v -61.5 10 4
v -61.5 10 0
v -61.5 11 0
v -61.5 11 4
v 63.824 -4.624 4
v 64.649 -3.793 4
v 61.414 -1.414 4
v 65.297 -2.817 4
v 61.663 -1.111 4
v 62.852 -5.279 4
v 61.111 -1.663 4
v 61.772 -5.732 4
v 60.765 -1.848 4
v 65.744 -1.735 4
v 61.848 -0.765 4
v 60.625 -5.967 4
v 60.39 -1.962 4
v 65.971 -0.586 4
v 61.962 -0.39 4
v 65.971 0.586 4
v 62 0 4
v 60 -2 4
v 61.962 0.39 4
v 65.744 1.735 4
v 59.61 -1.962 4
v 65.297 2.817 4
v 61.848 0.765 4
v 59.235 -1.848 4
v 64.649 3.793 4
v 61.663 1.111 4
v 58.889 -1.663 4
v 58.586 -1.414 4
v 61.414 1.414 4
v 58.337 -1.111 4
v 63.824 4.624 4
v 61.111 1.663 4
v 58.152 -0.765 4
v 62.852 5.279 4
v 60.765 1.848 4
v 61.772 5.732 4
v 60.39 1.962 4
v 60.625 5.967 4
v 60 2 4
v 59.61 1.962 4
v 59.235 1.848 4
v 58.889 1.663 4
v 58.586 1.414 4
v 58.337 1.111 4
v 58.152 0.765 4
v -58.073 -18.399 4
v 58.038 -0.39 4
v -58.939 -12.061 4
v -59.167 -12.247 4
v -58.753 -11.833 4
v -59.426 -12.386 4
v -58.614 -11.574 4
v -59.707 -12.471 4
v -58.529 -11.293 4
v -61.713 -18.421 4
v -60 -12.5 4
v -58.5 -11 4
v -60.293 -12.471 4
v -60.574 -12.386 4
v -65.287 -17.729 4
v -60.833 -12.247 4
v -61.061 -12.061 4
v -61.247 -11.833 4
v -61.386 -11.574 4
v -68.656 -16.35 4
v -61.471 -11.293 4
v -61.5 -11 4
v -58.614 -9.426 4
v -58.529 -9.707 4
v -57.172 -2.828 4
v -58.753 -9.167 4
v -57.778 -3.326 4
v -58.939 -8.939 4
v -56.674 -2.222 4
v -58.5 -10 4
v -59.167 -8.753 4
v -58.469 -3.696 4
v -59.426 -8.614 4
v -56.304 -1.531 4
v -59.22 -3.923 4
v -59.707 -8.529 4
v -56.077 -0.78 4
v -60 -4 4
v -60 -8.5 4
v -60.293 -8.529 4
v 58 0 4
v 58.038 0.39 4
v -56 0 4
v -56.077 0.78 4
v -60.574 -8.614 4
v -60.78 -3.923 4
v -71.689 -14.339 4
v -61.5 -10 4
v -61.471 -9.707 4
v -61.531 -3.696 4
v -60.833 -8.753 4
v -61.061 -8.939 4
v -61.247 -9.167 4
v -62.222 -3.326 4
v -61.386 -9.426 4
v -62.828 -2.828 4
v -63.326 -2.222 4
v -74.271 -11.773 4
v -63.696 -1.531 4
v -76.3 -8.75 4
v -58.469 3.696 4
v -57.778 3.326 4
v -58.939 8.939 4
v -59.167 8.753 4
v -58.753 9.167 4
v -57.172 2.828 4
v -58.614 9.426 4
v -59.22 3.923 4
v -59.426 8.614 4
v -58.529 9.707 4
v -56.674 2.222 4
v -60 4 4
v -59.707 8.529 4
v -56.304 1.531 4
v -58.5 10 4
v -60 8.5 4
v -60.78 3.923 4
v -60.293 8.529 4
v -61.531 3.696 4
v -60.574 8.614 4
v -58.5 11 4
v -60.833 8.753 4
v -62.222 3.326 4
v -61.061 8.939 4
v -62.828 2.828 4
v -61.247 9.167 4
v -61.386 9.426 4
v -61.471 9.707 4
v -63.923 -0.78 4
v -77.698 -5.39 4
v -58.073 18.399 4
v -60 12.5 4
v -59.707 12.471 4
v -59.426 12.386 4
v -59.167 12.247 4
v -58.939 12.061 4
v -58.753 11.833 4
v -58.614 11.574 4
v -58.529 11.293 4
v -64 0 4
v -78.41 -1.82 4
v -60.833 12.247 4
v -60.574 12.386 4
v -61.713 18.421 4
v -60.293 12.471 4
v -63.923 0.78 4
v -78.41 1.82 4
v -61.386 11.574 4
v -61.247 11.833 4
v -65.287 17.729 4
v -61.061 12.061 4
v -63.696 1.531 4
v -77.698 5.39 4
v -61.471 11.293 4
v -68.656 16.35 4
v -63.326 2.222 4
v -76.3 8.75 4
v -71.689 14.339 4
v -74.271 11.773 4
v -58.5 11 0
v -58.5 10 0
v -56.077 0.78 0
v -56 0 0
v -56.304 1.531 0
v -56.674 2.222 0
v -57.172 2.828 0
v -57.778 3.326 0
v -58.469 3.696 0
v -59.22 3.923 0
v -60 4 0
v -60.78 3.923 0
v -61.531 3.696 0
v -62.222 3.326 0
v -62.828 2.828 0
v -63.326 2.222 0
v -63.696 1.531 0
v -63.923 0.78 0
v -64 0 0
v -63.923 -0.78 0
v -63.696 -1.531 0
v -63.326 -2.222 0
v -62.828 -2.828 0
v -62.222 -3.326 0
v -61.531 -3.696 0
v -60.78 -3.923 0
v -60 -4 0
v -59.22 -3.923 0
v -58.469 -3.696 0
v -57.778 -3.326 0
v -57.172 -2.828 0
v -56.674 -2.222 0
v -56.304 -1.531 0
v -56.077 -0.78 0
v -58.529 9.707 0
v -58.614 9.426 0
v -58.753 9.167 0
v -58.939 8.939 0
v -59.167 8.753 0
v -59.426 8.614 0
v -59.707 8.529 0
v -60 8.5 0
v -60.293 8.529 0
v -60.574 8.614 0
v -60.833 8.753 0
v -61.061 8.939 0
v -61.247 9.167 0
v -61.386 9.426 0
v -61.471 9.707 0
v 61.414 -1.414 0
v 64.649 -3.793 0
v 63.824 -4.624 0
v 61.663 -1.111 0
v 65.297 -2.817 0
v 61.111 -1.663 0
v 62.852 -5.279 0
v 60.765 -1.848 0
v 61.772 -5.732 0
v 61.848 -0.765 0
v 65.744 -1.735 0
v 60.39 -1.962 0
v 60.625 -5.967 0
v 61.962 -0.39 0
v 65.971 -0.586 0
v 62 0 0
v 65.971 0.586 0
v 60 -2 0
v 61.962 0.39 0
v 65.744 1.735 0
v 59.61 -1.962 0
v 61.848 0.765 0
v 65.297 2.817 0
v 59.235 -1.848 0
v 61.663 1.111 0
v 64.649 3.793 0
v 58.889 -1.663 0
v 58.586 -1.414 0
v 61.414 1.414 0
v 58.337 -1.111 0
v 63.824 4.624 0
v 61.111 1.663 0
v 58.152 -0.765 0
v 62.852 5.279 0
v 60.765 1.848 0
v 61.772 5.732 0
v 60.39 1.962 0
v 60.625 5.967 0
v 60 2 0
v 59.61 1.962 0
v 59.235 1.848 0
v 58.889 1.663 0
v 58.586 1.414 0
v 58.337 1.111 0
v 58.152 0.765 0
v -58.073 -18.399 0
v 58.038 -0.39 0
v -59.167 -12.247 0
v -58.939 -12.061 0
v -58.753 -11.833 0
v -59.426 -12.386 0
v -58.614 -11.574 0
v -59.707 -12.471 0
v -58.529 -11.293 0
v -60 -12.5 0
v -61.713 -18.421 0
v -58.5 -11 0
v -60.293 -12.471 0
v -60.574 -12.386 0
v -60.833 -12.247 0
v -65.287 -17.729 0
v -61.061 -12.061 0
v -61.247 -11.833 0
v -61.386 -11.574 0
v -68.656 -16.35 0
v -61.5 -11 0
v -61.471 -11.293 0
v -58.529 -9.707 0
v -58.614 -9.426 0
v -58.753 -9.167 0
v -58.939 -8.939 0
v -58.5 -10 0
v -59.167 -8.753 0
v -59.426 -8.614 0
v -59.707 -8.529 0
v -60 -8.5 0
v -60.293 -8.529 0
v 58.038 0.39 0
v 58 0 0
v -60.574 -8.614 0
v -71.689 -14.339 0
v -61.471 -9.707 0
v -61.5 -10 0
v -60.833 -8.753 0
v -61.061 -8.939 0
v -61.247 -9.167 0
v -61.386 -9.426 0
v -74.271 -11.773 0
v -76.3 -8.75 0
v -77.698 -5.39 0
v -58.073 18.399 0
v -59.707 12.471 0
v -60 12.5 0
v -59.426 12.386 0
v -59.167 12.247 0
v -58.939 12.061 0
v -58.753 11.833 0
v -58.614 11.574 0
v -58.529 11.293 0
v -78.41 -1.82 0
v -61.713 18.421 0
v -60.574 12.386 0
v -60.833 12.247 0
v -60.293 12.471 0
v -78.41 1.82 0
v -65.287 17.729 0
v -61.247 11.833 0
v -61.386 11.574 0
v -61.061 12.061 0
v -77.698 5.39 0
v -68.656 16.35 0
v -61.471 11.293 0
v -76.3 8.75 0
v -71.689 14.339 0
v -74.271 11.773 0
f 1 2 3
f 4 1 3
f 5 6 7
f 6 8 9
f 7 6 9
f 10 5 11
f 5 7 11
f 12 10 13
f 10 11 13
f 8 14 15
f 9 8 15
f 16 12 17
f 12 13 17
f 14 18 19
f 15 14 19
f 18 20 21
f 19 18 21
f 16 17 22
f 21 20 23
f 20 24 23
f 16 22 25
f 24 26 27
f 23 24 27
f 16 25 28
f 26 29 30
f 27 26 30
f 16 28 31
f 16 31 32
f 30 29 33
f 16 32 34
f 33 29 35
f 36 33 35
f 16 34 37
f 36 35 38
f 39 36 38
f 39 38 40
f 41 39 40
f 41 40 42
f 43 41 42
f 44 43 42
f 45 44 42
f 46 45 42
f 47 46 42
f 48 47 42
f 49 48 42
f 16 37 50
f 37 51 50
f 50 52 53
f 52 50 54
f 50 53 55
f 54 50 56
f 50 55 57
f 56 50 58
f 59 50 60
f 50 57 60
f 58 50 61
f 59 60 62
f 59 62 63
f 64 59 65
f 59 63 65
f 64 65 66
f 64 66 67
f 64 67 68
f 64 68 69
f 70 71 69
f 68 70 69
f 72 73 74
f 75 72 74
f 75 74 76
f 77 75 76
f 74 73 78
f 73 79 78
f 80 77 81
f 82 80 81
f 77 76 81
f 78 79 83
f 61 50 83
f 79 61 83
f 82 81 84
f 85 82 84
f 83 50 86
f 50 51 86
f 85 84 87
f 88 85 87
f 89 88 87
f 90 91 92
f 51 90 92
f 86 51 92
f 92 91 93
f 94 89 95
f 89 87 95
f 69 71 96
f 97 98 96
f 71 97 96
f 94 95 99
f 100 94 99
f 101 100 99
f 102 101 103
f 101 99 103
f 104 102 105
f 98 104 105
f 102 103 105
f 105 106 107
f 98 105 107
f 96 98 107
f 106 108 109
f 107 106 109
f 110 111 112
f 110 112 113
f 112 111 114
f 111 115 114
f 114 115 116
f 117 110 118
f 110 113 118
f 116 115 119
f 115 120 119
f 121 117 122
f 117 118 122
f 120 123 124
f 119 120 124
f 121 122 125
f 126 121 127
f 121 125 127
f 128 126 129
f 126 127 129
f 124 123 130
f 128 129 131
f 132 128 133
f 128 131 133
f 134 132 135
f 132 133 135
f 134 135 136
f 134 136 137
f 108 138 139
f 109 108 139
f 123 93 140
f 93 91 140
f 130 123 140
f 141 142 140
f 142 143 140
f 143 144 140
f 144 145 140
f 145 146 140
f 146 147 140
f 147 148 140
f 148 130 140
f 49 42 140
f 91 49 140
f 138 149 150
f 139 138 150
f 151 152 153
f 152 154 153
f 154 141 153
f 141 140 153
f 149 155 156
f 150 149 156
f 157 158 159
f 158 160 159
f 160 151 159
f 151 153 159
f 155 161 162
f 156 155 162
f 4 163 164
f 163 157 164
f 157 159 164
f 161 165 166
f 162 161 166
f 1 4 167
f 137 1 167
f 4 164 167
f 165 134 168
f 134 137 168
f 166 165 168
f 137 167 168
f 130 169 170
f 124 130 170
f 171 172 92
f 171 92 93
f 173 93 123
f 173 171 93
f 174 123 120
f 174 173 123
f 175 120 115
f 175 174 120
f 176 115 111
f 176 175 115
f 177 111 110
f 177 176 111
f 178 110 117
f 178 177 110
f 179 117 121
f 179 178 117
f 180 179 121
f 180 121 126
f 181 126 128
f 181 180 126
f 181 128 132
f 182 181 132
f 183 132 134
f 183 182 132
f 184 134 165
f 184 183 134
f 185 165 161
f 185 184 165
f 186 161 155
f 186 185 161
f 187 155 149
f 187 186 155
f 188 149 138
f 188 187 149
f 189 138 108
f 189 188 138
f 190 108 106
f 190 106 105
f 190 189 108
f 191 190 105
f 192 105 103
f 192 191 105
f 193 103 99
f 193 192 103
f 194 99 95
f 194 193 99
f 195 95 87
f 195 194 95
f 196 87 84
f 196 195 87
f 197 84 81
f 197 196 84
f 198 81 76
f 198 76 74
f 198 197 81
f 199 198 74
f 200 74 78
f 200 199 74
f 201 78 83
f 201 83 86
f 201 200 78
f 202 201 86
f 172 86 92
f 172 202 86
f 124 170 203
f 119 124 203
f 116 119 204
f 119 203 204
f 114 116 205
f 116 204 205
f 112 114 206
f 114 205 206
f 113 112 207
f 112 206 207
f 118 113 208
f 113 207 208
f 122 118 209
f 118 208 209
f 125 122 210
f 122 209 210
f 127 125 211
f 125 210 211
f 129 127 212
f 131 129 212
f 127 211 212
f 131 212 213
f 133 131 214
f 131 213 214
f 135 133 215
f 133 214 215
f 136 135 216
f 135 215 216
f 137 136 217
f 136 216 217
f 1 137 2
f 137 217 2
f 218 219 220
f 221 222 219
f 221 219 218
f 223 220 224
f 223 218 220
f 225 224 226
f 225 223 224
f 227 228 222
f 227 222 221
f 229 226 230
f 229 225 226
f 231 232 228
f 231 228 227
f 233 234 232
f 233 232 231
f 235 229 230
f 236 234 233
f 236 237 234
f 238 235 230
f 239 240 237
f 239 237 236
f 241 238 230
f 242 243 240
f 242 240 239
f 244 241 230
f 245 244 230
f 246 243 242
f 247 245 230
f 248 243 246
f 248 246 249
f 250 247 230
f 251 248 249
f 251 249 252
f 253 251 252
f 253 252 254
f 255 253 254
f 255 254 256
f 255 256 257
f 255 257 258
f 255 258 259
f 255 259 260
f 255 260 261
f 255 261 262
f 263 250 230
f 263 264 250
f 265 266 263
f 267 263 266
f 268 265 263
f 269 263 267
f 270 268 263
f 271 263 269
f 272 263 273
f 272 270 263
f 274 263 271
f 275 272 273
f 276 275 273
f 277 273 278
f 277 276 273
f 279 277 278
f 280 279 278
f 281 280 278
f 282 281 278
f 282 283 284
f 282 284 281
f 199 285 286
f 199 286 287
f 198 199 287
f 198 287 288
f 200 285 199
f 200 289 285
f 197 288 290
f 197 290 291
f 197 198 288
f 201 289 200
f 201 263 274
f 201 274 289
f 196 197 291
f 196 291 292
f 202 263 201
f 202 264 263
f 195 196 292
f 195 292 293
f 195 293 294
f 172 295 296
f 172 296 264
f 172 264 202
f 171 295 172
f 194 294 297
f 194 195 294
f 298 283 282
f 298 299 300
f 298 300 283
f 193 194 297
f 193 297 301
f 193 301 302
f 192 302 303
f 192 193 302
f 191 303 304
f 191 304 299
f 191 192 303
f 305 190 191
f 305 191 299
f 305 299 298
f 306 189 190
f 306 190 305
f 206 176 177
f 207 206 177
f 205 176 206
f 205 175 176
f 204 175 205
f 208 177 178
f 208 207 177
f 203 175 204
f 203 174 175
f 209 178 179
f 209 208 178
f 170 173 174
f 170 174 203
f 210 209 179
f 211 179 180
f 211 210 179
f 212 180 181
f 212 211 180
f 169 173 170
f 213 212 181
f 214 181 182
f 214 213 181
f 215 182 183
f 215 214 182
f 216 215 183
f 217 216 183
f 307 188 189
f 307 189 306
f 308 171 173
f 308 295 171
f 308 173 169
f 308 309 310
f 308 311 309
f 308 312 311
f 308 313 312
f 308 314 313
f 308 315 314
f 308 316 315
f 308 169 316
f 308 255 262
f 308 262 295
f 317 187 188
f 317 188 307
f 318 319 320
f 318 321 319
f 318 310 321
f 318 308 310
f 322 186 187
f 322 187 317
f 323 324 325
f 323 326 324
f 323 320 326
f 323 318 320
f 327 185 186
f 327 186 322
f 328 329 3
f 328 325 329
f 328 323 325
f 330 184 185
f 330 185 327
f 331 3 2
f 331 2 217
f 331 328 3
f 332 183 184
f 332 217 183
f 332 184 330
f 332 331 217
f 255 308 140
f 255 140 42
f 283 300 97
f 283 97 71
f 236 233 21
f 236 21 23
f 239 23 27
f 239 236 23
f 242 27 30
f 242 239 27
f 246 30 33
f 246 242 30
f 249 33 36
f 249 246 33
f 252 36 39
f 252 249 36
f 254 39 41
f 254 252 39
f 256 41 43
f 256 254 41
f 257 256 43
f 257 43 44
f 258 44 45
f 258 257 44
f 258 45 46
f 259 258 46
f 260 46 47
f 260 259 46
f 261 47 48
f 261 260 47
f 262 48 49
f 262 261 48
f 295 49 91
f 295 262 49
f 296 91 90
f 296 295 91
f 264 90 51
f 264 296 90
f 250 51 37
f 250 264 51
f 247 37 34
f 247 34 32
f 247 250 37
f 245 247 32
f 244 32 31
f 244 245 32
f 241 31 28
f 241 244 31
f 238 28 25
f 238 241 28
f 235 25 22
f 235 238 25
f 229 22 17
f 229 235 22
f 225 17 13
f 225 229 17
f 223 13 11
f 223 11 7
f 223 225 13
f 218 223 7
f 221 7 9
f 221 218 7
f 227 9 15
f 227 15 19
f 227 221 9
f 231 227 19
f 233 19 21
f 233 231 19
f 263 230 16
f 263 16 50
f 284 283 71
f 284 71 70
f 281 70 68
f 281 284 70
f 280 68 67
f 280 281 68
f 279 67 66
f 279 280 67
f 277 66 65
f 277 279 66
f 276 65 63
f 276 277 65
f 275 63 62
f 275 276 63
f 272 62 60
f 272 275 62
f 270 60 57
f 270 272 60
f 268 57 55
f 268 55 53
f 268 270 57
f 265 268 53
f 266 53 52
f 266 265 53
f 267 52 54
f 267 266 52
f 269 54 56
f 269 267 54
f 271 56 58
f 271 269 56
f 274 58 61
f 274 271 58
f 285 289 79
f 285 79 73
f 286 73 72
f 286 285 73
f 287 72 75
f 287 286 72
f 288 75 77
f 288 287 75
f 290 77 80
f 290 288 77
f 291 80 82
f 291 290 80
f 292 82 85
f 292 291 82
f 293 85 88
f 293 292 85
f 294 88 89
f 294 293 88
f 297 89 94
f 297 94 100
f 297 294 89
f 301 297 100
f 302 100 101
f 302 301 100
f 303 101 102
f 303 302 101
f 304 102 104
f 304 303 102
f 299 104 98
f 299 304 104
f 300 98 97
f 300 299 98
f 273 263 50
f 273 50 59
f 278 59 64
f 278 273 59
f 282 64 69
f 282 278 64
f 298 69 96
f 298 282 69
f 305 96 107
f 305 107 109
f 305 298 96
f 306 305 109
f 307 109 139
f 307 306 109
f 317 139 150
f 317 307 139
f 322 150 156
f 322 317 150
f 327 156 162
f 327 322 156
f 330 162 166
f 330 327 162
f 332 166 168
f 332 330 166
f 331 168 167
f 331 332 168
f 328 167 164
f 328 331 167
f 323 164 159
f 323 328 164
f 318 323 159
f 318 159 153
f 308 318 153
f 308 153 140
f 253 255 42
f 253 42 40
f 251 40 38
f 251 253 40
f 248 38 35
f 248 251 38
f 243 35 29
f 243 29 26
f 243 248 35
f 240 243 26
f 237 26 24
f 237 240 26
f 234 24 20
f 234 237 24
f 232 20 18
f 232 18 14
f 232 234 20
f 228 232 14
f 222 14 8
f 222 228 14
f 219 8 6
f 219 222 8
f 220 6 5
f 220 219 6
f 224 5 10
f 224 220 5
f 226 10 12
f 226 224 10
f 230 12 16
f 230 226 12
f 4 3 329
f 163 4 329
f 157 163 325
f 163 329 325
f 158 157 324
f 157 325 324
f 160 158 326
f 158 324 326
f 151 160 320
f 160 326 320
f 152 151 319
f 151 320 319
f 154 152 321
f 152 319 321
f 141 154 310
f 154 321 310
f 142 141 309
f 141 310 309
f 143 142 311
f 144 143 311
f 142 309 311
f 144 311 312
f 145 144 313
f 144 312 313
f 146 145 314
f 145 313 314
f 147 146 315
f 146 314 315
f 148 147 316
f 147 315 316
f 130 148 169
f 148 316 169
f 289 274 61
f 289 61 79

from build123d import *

# Parameters (mm, degrees)
SKETCH1_R           = 2
SKETCH1_R_2         = 4
BOSS_EXTRUDE1_DEPTH = 4


with BuildPart() as part:
    # Sketch1 → Boss-Extrude1 (new body)
    with BuildSketch(Plane.XY):
        with BuildLine():
            Line((-58.072916667, 18.399357321), (60.625, 5.967359131))
            ThreePointArc((60.625, 5.967359131), (66, 0), (60.625, -5.967359131))
            Line((60.625, -5.967359131), (-58.072916667, -18.399357321))
            ThreePointArc((-58.072916667, -18.399357321), (-78.5, 0), (-58.072916667, 18.399357321))
        make_face()
        with Locations((60, 0)):
            Circle(SKETCH1_R, mode=Mode.SUBTRACT)
        with Locations((-60, 0)):
            Circle(SKETCH1_R_2, mode=Mode.SUBTRACT)
        with BuildLine():
            Line((-58.5, 11), (-58.5, 10))
            ThreePointArc((-58.5, 10), (-60, 8.5), (-61.5, 10))
            Line((-61.5, 10), (-61.5, 11))
            ThreePointArc((-61.5, 11), (-60, 12.5), (-58.5, 11))
        make_face(mode=Mode.SUBTRACT)
        with BuildLine():
            Line((-58.5, -11), (-58.5, -10))
            ThreePointArc((-58.5, -10), (-60, -8.5), (-61.5, -10))
            Line((-61.5, -10), (-61.5, -11))
            ThreePointArc((-61.5, -11), (-60, -12.5), (-58.5, -11))
        make_face(mode=Mode.SUBTRACT)
    extrude(amount=BOSS_EXTRUDE1_DEPTH)


solid = part.part
